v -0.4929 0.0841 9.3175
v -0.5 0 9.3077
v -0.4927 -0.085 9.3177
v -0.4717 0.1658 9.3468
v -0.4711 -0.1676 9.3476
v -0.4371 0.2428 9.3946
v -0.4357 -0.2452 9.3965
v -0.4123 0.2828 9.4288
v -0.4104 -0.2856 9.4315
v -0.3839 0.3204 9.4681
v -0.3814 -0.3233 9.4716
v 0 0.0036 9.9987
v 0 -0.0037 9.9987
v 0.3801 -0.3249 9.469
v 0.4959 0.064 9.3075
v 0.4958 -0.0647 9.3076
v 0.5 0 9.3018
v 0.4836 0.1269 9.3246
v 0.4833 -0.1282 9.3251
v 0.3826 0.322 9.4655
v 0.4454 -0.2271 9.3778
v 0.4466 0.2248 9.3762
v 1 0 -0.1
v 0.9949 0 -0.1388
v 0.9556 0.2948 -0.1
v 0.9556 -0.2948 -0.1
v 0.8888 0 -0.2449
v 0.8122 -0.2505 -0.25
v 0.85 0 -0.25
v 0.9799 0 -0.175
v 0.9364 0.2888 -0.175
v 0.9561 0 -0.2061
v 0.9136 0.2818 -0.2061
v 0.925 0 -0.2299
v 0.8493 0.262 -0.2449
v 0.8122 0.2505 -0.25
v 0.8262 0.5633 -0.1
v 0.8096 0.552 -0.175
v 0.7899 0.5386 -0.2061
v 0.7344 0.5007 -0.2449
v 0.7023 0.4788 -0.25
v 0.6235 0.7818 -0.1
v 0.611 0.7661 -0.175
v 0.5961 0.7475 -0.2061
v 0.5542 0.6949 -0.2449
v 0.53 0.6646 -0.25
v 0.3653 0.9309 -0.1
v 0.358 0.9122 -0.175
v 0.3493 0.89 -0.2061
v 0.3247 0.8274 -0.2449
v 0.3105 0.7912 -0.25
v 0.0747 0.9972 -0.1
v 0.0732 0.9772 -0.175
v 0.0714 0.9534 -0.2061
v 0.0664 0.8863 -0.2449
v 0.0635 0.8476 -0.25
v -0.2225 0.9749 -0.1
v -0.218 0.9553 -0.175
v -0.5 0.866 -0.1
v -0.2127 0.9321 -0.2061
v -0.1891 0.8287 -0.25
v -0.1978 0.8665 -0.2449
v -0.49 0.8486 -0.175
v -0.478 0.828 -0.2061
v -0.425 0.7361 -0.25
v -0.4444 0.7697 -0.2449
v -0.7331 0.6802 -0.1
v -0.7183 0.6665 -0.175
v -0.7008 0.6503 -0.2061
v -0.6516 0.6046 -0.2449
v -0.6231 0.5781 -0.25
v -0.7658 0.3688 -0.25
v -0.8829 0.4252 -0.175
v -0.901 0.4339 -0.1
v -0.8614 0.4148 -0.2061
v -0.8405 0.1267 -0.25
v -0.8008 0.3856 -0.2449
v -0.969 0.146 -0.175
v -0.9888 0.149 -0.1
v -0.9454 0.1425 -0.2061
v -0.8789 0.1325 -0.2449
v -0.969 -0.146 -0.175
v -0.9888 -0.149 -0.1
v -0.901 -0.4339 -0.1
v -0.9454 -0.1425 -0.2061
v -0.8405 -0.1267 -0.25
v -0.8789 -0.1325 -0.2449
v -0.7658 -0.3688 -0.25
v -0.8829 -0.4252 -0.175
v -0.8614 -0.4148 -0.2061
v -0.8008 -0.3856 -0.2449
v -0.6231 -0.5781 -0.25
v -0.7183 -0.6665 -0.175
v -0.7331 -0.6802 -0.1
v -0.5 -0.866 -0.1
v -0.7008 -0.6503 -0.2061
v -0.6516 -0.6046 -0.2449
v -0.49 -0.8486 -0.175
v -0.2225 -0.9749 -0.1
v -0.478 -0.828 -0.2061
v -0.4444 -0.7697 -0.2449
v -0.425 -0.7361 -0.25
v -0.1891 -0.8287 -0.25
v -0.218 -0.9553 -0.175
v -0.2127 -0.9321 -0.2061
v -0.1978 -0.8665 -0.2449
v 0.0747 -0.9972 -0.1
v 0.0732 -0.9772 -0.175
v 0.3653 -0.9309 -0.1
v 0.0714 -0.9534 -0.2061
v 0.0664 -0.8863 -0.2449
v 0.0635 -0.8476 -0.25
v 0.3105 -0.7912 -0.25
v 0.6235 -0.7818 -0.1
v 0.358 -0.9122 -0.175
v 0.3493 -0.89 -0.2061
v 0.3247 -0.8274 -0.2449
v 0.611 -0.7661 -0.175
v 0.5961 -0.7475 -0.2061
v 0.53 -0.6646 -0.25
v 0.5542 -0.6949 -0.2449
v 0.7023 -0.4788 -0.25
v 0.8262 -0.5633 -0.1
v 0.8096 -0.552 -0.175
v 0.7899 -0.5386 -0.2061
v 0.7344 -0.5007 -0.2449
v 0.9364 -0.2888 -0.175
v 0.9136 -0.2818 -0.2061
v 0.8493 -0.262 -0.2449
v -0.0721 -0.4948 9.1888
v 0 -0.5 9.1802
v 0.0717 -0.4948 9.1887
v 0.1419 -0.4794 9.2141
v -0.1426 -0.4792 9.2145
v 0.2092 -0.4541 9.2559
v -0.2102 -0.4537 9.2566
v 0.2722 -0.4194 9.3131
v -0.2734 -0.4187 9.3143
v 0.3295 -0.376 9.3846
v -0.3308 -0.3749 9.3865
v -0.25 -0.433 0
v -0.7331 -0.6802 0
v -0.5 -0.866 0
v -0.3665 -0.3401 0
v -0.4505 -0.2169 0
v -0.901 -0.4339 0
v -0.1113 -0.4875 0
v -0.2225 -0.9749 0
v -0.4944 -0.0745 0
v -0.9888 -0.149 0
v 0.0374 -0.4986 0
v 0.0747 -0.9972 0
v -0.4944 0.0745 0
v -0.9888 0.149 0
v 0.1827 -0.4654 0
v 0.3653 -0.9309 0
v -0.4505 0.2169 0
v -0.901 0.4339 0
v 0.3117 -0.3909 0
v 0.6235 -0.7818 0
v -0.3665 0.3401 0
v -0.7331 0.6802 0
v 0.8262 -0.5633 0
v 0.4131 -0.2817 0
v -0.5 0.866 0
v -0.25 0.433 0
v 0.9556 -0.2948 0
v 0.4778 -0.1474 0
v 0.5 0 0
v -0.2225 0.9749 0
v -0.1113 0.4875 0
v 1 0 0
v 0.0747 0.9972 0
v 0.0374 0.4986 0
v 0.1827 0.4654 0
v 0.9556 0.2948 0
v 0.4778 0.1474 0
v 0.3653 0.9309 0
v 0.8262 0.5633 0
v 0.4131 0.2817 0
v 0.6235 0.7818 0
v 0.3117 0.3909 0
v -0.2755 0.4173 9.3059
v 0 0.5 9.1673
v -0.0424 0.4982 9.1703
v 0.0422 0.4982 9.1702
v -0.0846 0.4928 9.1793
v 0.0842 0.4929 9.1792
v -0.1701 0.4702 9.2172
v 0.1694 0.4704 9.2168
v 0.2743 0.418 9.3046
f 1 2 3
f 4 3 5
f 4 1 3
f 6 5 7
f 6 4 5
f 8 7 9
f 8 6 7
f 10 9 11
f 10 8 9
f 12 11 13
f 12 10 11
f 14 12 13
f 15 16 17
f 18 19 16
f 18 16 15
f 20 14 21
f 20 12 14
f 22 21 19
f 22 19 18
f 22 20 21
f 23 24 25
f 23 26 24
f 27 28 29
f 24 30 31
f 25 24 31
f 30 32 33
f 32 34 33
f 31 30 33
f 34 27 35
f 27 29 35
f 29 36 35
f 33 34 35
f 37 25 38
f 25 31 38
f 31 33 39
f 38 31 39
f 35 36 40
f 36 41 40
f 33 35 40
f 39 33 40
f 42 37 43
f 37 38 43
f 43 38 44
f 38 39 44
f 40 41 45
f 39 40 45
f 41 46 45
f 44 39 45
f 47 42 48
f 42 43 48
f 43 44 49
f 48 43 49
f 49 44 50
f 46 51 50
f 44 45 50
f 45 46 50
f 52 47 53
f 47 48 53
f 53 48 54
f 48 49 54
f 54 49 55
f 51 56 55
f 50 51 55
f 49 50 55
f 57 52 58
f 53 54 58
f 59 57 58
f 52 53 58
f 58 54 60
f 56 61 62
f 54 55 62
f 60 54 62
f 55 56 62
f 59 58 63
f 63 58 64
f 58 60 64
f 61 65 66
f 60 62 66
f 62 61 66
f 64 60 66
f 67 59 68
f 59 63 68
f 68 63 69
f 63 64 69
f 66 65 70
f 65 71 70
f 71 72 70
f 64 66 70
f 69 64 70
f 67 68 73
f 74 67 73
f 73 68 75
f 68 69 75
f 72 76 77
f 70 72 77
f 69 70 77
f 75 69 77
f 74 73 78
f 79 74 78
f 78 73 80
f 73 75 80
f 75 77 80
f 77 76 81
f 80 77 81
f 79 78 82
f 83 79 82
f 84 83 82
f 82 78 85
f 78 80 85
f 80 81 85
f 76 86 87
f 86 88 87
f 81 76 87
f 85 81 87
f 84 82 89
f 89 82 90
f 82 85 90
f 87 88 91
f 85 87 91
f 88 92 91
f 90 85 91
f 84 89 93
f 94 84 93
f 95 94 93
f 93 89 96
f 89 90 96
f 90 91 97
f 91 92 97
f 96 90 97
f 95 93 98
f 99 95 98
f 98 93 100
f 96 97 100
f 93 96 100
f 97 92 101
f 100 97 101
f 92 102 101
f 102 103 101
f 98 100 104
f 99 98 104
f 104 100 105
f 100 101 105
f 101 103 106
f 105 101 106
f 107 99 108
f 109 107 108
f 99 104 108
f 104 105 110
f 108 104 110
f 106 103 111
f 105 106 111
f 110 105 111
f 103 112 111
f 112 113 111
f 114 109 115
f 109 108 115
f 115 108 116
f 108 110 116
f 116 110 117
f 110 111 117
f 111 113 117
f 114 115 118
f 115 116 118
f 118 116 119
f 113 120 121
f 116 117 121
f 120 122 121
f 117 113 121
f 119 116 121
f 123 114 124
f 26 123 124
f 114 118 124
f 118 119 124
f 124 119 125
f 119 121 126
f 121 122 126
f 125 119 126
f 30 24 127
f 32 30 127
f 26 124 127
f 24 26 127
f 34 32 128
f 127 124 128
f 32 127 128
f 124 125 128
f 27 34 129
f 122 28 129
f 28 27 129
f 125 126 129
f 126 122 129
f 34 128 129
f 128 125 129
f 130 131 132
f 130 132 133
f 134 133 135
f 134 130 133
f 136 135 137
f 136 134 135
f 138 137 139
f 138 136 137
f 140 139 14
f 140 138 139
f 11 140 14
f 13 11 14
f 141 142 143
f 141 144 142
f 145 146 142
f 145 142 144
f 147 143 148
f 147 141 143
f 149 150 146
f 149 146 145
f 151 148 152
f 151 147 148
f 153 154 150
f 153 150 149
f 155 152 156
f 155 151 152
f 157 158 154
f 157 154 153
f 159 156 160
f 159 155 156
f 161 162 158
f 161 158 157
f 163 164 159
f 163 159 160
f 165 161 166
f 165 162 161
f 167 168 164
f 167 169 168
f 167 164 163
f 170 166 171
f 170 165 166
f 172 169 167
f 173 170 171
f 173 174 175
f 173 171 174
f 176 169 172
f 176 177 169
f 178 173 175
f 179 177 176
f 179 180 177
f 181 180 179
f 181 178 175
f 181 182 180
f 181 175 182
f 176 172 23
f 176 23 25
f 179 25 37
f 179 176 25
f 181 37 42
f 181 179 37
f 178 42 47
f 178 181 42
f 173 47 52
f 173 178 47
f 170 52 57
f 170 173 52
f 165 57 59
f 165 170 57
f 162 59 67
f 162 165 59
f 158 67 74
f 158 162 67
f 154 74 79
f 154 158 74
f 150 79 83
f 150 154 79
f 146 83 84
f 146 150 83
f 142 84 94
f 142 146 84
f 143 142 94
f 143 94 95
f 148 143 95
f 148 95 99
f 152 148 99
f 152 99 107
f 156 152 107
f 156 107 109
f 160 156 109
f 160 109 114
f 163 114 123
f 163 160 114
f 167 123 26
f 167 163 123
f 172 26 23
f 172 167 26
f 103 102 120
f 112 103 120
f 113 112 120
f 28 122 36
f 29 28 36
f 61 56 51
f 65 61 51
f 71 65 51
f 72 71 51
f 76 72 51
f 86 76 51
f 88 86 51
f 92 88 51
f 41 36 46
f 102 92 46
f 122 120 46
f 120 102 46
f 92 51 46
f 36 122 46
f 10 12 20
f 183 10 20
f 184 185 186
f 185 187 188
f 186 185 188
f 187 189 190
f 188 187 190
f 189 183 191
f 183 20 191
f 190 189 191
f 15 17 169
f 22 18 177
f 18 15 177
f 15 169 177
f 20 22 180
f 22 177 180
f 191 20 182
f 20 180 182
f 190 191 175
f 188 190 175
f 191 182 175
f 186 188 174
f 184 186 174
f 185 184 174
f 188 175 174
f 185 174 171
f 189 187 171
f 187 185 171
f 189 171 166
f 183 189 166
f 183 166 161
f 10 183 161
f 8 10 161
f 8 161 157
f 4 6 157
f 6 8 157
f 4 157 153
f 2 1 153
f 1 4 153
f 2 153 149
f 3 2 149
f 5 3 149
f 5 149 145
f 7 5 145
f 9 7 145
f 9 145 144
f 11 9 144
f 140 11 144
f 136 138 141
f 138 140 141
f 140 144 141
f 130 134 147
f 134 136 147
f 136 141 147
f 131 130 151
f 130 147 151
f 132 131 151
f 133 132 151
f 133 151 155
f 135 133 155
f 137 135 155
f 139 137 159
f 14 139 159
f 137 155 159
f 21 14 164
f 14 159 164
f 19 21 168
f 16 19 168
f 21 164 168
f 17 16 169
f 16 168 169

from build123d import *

# Parameters (mm, degrees)
F0_R          = 0.5
F1_DEPTH      = 10
F0_R_2        = 1
F2_DEPTH      = 0.25
F3_R          = 0.15
F5_DEPTH      = 25
F5_DEPTH_BACK = 25
F7_DEPTH      = 25
F7_DEPTH_BACK = 25


with BuildPart() as f1:
    # F0 (on Top) → F1 (new body)
    with BuildSketch(Plane.XY):
        Circle(F0_R)
    extrude(amount=F1_DEPTH)

    # F0 (on Top) → F2 (join)
    with BuildSketch(Plane.XY):
        Circle(F0_R_2)
        Circle(F0_R, mode=Mode.SUBTRACT)
        Circle(F0_R)
    extrude(amount=-F2_DEPTH)

    # F3
    f3_edges = [f1.edges().sort_by_distance(p)[0] for p in [
        (-1, 0, -0.25),
    ]]
    fillet(f3_edges, radius=F3_R)

    # F4 (on Right) → F5 (cut, two sides)
    with BuildSketch(Plane.YZ) as f5_sk:
        Polygon((-0.5701061455, 9.0645924211), (0, 10.0047653541), (0.5819916259, 9.0299136937), (0.5819916259, 10.0856823847), (-0.6548758829, 10.0856823847), align=None)
    extrude(amount=F5_DEPTH, mode=Mode.SUBTRACT)
    extrude(f5_sk.sketch, amount=-F5_DEPTH_BACK, mode=Mode.SUBTRACT)

    # F6 (on Front) → F7 (cut, two sides)
    with BuildSketch(Plane.XZ) as f7_sk:
        Polygon((-0.5932200584, 9.1788349673), (0, 9.9986912683), (0.5793294404, 9.1912103817), (0.6381116109, 10.2987894788), (-0.5932200584, 10.2987894788), align=None)
    extrude(amount=F7_DEPTH, mode=Mode.SUBTRACT)
    extrude(f7_sk.sketch, amount=-F7_DEPTH_BACK, mode=Mode.SUBTRACT)


solid = f1.part
